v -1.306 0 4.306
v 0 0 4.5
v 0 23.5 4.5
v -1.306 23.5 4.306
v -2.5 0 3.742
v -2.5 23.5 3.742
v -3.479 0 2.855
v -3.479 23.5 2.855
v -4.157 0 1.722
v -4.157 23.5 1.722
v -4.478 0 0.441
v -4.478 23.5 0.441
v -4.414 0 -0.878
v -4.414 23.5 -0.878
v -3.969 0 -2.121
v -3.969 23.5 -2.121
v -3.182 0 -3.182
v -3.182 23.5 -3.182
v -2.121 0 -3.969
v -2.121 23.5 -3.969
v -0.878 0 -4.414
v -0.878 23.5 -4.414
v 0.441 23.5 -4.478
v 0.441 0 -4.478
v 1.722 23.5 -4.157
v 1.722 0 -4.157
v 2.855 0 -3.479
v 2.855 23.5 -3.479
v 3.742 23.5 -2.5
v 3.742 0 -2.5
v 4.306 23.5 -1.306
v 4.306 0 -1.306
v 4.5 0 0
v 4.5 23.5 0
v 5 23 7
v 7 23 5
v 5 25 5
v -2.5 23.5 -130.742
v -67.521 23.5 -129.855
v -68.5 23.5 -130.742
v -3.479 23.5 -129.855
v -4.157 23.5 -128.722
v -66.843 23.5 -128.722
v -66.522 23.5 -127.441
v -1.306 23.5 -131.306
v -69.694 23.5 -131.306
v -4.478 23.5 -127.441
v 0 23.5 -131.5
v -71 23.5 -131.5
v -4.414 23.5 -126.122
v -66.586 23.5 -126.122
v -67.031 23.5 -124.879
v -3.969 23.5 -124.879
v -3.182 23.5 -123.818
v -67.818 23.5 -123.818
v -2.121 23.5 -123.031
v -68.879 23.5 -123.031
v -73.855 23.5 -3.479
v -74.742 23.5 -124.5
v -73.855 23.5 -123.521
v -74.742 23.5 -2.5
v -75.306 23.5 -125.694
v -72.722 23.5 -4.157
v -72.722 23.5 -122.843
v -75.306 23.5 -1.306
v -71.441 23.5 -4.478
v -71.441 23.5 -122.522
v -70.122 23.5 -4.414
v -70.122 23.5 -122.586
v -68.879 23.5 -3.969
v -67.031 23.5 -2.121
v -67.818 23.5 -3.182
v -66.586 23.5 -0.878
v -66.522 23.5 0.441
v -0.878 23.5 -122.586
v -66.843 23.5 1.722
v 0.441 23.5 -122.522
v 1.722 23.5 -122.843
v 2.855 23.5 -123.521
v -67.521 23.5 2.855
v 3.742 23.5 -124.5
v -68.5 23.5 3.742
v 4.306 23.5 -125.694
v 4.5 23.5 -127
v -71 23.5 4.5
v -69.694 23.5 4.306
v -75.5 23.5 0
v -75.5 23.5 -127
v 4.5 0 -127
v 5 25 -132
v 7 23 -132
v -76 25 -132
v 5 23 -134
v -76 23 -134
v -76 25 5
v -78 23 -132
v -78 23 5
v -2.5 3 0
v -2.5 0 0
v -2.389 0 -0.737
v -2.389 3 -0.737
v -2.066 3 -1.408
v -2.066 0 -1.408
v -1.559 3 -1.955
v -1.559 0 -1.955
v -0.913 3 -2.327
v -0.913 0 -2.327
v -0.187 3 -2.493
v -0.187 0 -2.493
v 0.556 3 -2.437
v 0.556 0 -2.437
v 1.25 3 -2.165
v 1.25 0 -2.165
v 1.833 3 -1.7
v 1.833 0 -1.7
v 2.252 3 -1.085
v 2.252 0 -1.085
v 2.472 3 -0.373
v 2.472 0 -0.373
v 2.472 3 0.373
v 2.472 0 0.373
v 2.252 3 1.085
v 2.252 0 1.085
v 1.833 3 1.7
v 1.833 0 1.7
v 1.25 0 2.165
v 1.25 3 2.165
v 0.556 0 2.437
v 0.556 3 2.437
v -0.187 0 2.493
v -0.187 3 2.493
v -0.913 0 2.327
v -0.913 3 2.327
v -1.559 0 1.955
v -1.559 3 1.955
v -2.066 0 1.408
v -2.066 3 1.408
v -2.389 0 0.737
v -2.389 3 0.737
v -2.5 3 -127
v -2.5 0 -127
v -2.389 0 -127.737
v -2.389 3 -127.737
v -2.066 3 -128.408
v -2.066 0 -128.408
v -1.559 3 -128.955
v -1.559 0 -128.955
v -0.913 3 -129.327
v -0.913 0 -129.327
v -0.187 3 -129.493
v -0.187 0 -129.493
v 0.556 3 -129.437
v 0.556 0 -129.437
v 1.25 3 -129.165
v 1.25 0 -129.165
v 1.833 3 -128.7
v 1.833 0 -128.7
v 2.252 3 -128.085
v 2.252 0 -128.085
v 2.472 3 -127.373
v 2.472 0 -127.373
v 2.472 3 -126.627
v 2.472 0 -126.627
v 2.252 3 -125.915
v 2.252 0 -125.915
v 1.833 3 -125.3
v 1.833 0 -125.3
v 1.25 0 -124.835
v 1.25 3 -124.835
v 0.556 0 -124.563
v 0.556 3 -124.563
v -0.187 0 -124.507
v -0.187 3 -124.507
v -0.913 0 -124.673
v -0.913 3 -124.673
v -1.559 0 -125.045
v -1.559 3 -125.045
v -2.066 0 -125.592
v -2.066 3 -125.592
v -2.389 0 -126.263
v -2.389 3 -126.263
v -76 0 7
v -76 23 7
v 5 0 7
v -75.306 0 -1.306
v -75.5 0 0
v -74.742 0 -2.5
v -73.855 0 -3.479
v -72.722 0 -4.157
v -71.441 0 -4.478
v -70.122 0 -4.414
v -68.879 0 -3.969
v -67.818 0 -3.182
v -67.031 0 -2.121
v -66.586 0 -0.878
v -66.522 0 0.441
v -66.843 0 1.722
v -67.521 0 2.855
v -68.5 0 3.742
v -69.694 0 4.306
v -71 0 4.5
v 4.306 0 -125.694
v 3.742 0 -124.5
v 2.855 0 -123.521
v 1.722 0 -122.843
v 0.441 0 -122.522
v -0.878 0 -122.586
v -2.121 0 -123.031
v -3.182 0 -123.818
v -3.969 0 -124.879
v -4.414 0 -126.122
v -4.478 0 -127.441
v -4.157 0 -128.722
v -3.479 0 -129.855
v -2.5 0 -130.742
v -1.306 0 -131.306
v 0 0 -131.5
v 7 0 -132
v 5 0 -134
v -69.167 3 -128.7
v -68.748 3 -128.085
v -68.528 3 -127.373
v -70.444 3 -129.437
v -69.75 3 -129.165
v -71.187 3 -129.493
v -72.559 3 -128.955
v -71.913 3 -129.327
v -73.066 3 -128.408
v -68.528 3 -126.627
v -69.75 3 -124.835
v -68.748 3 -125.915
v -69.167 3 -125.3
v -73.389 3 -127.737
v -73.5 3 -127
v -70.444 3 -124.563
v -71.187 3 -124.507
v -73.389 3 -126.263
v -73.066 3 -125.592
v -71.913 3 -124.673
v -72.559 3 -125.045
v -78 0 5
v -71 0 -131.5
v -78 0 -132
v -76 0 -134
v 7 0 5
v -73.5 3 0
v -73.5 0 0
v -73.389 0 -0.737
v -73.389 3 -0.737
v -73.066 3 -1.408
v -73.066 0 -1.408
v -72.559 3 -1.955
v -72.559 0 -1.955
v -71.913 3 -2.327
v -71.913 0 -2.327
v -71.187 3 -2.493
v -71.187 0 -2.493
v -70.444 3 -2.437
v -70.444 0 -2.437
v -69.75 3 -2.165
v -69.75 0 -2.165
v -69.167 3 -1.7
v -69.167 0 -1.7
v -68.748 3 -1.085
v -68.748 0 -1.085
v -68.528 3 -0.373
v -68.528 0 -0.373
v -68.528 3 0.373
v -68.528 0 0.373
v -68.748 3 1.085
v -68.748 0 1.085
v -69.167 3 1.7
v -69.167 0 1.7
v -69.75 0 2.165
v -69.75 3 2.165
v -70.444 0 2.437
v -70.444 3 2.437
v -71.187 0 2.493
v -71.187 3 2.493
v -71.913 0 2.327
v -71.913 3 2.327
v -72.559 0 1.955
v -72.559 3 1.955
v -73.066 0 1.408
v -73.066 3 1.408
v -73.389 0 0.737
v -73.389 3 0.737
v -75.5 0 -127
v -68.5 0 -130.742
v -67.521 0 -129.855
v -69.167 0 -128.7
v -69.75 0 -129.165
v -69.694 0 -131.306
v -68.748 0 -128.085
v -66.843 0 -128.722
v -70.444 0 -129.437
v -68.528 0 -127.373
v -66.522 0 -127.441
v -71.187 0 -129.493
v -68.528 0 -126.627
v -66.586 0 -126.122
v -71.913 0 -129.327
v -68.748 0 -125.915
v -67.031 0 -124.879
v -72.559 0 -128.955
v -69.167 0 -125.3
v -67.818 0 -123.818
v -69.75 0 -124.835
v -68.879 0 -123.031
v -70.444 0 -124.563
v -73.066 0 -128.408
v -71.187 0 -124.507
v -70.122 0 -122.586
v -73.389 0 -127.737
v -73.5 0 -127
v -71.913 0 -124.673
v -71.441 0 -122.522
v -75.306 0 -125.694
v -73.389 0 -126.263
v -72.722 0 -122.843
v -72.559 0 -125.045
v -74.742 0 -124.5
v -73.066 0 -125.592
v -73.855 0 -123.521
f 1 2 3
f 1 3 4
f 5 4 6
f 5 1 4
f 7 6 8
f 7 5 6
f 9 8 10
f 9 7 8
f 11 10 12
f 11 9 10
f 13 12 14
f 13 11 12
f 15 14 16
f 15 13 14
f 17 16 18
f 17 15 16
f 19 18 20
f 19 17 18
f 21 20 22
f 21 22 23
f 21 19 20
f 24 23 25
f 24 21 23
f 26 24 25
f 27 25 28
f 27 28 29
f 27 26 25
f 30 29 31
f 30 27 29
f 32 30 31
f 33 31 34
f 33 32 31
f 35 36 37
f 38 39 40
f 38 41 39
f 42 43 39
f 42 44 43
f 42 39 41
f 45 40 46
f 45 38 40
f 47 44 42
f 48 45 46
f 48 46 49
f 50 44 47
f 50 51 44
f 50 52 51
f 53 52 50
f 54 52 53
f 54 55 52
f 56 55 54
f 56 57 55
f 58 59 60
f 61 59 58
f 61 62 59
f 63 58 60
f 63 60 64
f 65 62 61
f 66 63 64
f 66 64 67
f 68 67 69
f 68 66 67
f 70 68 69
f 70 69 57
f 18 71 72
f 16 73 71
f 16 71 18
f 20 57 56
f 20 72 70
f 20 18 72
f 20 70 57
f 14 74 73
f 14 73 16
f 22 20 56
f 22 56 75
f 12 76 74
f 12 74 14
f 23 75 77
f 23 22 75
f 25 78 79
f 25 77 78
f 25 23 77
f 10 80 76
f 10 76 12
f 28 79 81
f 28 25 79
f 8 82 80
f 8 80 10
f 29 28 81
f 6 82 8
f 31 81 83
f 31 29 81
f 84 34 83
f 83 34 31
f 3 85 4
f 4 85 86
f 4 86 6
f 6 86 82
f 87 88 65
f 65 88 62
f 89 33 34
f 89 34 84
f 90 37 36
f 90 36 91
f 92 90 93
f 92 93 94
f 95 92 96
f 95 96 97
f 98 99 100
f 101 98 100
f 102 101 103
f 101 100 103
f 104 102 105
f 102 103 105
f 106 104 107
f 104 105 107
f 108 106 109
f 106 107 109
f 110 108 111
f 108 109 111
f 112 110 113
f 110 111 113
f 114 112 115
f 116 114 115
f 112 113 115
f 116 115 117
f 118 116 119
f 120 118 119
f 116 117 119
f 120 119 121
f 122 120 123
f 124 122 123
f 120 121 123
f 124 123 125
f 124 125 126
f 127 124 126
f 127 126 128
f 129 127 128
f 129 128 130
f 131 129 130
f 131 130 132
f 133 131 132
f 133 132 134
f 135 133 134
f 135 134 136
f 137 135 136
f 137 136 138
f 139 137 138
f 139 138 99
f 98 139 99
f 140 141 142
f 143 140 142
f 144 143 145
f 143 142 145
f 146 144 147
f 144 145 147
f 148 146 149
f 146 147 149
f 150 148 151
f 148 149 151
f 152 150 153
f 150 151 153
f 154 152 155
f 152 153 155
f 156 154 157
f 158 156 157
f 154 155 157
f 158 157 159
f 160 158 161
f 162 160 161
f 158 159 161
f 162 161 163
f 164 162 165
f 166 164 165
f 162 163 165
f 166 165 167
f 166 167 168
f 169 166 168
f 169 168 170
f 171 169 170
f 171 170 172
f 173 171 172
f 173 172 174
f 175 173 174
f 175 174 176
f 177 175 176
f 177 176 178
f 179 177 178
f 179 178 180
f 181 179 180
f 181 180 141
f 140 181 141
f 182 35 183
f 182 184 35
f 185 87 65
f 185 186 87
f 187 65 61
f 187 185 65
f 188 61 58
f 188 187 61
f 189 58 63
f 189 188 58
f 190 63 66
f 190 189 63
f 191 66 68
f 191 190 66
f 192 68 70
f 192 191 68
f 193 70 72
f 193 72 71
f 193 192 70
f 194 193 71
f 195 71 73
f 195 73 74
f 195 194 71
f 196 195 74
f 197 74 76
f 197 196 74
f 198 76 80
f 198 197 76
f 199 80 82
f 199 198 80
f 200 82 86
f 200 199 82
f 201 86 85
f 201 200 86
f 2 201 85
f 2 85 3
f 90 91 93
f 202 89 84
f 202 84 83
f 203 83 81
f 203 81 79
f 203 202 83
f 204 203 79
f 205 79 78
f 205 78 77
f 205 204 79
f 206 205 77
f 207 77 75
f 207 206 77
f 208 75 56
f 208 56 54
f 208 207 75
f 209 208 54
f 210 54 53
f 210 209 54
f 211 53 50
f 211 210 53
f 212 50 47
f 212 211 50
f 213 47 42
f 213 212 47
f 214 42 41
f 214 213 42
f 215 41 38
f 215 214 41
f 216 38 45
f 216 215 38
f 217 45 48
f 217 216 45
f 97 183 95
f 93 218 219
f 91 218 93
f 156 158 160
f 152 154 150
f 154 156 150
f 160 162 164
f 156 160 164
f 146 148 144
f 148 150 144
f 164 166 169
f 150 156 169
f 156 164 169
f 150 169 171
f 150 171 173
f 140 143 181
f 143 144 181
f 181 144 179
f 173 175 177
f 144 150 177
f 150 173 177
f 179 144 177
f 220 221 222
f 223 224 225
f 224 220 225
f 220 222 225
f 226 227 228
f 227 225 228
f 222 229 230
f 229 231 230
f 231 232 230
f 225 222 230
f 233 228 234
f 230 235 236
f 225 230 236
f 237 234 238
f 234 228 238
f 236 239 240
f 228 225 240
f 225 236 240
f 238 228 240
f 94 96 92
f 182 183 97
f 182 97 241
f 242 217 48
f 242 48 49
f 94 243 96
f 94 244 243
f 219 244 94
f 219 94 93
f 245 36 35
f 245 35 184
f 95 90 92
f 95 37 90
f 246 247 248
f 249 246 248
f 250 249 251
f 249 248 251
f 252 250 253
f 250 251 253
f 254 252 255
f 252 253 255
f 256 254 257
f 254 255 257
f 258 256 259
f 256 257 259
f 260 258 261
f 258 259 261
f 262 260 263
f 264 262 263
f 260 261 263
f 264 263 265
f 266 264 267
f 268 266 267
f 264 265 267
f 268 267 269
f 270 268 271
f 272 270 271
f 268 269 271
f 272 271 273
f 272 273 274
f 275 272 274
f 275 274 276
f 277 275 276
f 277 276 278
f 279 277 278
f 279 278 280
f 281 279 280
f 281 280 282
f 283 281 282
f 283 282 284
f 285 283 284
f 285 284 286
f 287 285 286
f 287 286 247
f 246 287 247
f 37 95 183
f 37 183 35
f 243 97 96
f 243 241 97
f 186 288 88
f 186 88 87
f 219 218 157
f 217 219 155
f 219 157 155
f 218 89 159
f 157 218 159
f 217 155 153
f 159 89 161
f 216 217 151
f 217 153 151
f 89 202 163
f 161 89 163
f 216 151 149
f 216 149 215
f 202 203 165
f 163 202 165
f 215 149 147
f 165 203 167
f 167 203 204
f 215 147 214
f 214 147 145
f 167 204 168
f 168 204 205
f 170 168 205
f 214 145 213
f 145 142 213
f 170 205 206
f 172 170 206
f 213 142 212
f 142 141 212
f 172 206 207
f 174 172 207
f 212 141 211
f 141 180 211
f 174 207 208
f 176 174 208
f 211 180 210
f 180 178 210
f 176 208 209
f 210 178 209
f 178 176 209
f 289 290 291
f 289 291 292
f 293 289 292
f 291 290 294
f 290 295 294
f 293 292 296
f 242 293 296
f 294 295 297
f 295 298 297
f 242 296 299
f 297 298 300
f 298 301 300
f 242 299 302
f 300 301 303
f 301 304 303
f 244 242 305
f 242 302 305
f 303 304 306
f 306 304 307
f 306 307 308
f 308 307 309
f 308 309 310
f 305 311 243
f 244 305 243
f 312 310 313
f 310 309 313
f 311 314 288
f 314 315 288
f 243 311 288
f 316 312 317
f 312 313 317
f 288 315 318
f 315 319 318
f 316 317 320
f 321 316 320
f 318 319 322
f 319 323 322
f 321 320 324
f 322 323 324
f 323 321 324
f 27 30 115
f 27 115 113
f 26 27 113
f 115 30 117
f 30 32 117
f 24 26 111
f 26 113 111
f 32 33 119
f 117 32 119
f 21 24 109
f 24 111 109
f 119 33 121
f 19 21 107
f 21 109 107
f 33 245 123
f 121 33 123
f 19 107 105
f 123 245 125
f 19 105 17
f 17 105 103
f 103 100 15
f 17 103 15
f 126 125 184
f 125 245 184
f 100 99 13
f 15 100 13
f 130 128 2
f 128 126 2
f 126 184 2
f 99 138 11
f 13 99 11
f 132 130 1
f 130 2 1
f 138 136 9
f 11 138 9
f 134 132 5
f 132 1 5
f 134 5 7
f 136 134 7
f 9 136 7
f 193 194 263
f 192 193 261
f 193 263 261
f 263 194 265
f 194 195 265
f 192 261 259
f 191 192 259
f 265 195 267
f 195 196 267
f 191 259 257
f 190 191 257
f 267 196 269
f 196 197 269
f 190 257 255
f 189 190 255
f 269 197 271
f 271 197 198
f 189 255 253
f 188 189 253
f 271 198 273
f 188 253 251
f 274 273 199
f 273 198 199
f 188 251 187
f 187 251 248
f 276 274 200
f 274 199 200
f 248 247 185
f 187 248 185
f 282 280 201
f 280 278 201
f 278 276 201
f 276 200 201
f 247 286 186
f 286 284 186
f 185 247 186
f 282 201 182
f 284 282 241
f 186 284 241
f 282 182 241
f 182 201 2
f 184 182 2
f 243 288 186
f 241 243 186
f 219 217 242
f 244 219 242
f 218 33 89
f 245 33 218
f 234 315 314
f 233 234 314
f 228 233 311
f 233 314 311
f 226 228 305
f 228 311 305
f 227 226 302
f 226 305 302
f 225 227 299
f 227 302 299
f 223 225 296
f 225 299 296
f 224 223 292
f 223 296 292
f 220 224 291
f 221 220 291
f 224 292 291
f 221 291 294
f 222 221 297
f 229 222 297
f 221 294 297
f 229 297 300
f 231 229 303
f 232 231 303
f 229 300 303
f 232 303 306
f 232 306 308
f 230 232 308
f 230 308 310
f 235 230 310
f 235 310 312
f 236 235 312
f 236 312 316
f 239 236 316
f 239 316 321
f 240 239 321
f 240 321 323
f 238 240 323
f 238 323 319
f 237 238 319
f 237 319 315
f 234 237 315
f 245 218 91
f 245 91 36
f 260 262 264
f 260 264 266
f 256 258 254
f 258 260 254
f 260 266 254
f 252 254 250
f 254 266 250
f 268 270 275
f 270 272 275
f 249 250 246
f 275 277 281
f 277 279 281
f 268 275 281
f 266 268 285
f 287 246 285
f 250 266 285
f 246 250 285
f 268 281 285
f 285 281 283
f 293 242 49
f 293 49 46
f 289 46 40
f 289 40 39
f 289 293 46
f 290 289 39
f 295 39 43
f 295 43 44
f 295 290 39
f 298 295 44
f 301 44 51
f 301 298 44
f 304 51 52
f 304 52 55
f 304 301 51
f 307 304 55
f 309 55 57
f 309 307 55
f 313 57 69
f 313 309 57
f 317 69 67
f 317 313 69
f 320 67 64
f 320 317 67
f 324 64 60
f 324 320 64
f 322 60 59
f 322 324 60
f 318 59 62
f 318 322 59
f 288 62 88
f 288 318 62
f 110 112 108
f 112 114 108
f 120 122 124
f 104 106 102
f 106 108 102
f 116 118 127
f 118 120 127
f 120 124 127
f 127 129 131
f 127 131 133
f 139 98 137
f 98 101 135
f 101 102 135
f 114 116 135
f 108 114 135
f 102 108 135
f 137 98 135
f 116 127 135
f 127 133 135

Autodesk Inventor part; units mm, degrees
ref_plane "YZ Plane" through (0, 0, 0) normal (1, 0, 0) x (0, 1, 0)
ref_plane "XZ Plane" through (0, 0, 0) normal (0, 1, 0) x (-1, 0, 0)
ref_plane "XY Plane" through (0, 0, 0) normal (0, 0, 1) x (1, 0, 0)
sketch "Skizze1" plane through (0, 0, 0) normal (0, 1, 0) x (-1, 0, 0)
  line L0 (0, 0) -> (0, -127)
  line L1 (0, -127) -> (71, -127)
  line L2 (71, -127) -> (71, 0)
  line L3 (71, 0) -> (0, 0)
  circle A0 centre (71, 0) radius 2.5
  circle A1 centre (71, -127) radius 2.5
  circle A2 centre (0, -127) radius 2.5
  circle A3 centre (0, 0) radius 2.5
  dimension "d0" = 127
  dimension "d1" = 71
  dimension "d2" = 5
  dimension "d3" = 5
  dimension "d4" = 5
  dimension "d5" = 5
sketch "Skizze2" plane through (0, 0, 0) normal (0, 1, 0) x (-1, 0, 0)
  line L0 (71, -127) -> (71, 0) projected
  line L1 (71, 0) -> (0, 0) projected
  line L2 (0, 0) -> (0, -127) projected
  line L3 (0, -127) -> (71, -127) projected
  line L4 (78, 7) -> (78, -134)
  line L5 (78, -134) -> (-7, -134)
  line L6 (-7, -134) -> (-7, 7)
  line L7 (-7, 7) -> (78, 7)
  dimension "d6" = 7
extrude "Extrusion1" add sketch "Skizze2" along normal blind 25 contours L3 L2 L1 L0 | L4 L5 L6 L7
extrude "Extrusion2" cut sketch "Skizze1" along normal blind 3 contours L3 A3 L0 | L0 A3 L3 | A2 L1 L0 | L0 L1 A2 | A0 L2 L3 | L3 L2 A0 | A1 L2 L1 | L1 L2 A1
sketch "Skizze3" plane through (0, 0, 0) normal (0, -1, 0) x (1, 0, 0)
  circle A0 centre (-71, -127) radius 2.5 projected
  circle A1 centre (-71, -127) radius 4.5
  circle A2 centre (-71, 0) radius 2.5 projected
  circle A3 centre (-71, 0) radius 4.5
  circle A4 centre (0, 0) radius 2.5 projected
  circle A5 centre (0, 0) radius 4.5
  circle A6 centre (0, -127) radius 2.5 projected
  circle A7 centre (0, -127) radius 4.5
  line L0 (-78, 7) -> (7, 7) projected
  line L1 (-78, -134) -> (-78, 7) projected
  line L2 (7, -134) -> (-78, -134) projected
  line L3 (7, 7) -> (7, -134) projected
  line L4 (-75.5, 4.5) -> (4.5, 4.5)
  line L5 (4.5, 4.5) -> (4.5, -131.5)
  line L6 (4.5, -131.5) -> (-75.5, -131.5)
  line L7 (-75.5, -131.5) -> (-75.5, 4.5)
  point P0 (-35.5, 7)
  point P1 (-78, -63.5)
  point P2 (-75.5, 0)
  point P3 (-75.5, -127)
  point P4 (-71, -131.5)
  point P5 (0, -131.5)
  point P6 (4.5, -127)
  point P7 (4.5, 0)
  point P8 (0, 4.5)
  point P9 (-71, 4.5)
  dimension "d11" = 9
  dimension "d12" = 9
  dimension "d13" = 9
  dimension "d14" = 9
extrude "Extrusion3" cut sketch "Skizze3" against normal blind 23.5 contours A1 L7 A3 L4 A5 L5 A7 L6
chamfer "Fasen1" distance 2 angle 45 8 edges at (-78, 12.5, -134) (-78, 12.5, 7) (7, 12.5, -134) (7, 12.5, 7) (7, 25, -63.5) (-35.5, 25, 7) (-78, 25, -63.5) (-35.5, 25, -134)
properties part number "LV_Deckel"
